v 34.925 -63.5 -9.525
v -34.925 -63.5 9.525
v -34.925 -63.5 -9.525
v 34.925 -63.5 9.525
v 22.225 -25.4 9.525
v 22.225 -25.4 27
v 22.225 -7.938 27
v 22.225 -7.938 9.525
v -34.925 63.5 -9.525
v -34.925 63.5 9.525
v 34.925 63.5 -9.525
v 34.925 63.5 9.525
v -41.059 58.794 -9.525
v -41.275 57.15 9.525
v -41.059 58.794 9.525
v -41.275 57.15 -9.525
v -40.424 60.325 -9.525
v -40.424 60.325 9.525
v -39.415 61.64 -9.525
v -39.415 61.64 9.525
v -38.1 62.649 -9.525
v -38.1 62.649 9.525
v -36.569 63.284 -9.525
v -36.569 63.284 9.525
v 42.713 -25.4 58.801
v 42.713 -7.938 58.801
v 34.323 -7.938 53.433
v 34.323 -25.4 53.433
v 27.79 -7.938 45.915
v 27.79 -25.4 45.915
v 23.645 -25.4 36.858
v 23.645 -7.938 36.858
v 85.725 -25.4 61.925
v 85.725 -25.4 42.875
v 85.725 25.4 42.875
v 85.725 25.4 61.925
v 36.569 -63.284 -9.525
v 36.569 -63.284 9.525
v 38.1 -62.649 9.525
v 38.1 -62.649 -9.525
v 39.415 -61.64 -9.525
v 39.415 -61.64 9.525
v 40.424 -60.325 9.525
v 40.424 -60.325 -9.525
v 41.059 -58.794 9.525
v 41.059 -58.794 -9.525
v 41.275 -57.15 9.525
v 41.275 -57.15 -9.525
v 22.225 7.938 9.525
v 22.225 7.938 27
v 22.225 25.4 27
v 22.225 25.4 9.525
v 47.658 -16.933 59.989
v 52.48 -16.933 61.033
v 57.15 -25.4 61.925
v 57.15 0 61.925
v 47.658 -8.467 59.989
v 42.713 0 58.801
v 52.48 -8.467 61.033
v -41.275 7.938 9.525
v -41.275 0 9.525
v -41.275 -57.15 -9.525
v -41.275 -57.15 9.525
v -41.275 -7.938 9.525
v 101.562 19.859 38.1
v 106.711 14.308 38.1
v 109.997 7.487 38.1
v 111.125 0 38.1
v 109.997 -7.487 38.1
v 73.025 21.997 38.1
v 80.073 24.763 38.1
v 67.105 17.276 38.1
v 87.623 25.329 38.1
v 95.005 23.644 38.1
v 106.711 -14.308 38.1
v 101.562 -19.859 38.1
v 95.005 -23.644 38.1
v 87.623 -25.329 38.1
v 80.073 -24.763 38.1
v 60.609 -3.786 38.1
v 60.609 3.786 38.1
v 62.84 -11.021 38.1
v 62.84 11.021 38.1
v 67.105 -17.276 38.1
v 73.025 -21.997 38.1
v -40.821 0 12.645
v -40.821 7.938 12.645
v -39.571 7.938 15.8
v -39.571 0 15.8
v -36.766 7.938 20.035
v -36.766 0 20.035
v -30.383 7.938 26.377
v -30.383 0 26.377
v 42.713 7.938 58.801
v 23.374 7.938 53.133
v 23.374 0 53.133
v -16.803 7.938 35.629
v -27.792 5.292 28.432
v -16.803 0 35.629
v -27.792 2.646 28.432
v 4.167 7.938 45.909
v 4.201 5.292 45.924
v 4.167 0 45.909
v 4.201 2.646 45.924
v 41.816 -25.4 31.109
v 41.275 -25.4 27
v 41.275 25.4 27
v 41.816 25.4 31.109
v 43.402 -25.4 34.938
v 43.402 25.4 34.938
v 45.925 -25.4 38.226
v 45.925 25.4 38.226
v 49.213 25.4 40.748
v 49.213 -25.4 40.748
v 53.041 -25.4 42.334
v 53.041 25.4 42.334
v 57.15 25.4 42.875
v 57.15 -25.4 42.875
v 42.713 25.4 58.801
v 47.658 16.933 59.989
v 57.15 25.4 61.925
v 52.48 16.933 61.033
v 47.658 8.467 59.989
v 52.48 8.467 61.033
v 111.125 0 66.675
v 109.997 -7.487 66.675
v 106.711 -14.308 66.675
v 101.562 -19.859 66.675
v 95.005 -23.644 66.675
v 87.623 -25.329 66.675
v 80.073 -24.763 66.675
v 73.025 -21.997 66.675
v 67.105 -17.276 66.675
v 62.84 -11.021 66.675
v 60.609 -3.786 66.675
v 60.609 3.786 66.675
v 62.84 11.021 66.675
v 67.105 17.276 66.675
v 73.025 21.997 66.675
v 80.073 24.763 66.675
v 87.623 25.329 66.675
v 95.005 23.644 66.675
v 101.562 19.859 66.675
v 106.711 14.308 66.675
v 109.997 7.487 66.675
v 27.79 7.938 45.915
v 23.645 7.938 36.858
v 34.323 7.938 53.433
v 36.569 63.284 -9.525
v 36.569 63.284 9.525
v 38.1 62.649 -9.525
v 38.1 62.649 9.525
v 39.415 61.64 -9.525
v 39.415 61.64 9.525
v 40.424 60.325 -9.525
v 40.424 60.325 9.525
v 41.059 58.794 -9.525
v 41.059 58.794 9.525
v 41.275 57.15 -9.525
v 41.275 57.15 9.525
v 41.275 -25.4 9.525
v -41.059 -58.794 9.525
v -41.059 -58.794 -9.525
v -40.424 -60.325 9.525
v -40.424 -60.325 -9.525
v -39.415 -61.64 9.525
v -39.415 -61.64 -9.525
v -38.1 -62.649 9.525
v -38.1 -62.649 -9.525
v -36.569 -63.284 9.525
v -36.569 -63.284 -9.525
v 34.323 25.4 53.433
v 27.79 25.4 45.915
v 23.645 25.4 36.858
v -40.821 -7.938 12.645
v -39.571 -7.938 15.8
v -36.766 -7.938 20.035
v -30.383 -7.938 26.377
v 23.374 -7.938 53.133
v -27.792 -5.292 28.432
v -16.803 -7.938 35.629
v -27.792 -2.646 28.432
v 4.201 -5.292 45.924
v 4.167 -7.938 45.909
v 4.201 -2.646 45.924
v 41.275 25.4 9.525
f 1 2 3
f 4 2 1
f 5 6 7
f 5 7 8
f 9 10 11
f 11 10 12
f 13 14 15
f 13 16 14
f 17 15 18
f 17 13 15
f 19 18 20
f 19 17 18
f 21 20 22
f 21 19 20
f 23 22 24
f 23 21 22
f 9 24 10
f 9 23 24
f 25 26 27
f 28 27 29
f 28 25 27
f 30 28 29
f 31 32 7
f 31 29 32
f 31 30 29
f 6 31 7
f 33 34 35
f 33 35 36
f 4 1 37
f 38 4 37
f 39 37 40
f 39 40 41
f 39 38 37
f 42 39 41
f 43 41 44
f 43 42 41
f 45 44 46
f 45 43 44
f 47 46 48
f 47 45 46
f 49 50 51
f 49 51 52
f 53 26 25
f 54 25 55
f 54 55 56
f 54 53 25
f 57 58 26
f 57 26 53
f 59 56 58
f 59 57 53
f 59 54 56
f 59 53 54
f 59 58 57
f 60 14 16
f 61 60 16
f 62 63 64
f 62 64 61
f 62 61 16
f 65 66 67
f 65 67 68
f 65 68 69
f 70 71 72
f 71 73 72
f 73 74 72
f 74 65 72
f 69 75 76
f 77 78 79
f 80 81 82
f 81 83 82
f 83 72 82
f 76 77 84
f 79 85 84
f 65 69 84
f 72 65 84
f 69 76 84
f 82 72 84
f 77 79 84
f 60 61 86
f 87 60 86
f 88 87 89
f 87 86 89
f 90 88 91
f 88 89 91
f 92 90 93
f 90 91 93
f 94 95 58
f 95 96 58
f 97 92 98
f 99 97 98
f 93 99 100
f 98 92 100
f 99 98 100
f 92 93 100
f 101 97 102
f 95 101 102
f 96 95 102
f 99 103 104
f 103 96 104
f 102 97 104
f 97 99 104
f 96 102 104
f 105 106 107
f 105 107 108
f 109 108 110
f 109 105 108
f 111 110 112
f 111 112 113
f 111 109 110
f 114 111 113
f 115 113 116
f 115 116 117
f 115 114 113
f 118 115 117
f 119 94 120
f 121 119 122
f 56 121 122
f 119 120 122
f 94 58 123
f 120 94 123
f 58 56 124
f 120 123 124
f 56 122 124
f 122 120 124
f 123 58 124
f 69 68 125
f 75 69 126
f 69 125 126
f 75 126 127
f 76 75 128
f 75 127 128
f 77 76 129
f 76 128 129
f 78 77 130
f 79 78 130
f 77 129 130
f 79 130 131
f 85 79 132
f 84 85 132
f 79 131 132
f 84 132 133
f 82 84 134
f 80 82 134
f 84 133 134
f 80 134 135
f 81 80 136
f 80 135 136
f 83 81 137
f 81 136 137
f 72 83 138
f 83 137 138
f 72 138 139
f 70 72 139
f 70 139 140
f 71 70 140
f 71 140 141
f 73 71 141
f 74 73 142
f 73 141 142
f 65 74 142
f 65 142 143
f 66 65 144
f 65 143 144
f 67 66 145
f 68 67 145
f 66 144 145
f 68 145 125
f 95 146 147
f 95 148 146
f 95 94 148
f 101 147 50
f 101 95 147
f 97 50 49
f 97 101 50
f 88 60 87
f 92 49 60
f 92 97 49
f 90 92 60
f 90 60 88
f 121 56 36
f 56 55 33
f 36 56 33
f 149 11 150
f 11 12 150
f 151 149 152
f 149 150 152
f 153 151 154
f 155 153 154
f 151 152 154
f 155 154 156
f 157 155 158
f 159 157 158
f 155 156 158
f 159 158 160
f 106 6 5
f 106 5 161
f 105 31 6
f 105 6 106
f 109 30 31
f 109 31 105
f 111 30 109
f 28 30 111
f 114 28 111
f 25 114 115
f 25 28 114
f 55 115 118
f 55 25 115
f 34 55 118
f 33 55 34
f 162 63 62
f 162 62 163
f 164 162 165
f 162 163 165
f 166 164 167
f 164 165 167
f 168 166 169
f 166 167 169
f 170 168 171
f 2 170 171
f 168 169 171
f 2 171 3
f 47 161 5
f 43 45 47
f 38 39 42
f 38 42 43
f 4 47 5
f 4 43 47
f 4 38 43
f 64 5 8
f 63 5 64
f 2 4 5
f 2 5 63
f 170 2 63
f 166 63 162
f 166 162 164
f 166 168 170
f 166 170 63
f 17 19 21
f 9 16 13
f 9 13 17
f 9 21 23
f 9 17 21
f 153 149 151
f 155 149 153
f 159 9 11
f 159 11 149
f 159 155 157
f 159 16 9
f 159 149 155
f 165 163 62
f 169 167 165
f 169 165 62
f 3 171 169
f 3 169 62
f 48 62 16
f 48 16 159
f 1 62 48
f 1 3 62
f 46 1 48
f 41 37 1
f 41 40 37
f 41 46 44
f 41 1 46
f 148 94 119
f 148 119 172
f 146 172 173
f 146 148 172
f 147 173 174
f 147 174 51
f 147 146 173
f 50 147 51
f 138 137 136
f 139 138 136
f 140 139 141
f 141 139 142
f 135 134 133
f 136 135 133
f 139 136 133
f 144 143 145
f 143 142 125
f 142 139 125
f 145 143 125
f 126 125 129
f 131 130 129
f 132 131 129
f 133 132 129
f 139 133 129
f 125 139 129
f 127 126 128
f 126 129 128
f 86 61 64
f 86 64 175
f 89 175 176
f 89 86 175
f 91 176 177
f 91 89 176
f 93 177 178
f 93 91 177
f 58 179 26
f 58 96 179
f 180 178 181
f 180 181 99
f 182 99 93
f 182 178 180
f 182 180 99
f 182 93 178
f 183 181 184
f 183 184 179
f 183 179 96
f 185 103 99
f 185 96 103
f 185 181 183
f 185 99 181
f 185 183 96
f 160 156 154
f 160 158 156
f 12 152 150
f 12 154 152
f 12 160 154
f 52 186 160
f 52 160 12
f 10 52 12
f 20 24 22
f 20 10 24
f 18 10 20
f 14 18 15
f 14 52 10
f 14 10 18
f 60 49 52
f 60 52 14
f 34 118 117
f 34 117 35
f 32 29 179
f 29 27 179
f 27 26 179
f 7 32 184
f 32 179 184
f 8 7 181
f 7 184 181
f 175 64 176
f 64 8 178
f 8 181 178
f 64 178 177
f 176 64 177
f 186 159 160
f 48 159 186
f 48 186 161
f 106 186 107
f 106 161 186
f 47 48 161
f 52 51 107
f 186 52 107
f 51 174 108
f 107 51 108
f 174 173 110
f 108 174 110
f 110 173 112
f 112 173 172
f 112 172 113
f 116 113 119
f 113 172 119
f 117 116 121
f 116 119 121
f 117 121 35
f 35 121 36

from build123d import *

# Parameters (mm, degrees)
F1_DEPTH = 25.4
F2_DEPTH = 63.5
F0_W     = 25.4
F0_H     = 19.05
F3_DEPTH = 25.4
F4_DEPTH = 7.9375
F6_R     = 6.35


with BuildPart() as f1:
    # F0 (on Front) → F1 (new body, symmetric)
    with BuildSketch(Plane.XZ):
        with BuildLine():
            Line((22.225, 9.525), (41.275, 9.525))
            Line((41.275, 9.525), (41.275, 27.0002))
            ThreePointArc((41.275, 27.0002), (45.9246798487, 38.2255201513), (57.15, 42.8752))
            Line((57.15, 42.8752), (60.325, 42.8752))
            Line((60.325, 42.8752), (60.325, 61.9252))
            Line((60.325, 61.9252), (57.15, 61.9252))
            add(Edge.make_bspline(
                [(42.7127144253, 58.8014642867), (47.7105898619, 60.0589943482), (52.5646894351, 61.1113536109), (57.15, 61.9252)],
                knots=[98.4748770182, 98.4748770182, 98.4748770182, 98.4748770182, 111.5045361635, 111.5045361635, 111.5045361635, 111.5045361635], degree=3))
            ThreePointArc((42.7127144253, 58.8014642867), (27.7903523208, 45.9149221273), (22.225, 27.0002))
            Line((22.225, 27.0002), (22.225, 9.525))
        make_face()
    extrude(amount=F1_DEPTH, both=True)

    # F0 (on Front) → F2 (join, symmetric)
    with BuildSketch(Plane.XZ):
        Polygon((-41.275, 9.525), (-41.275, -9.525), (41.275, -9.525), (41.275, 9.525), (22.225, 9.525), align=None)
    extrude(amount=F2_DEPTH, both=True)

    # F0 (on Front) → F3 (join, symmetric)
    with BuildSketch(Plane.XZ):
        with Locations((73.025, 52.4002)):
            Rectangle(F0_W, F0_H)
    extrude(amount=F3_DEPTH, both=True)

    # F0 (on Front) → F4 (join, symmetric)
    with BuildSketch(Plane.XZ):
        with BuildLine():
            add(Edge.make_bspline(
                [(-41.275, 9.525), (-41.0450619482, 28.0740104244), (4.9400326168, 49.2973693012), (42.7127144253, 58.8014642867)],
                knots=[0, 0, 0, 0, 98.4748770182, 98.4748770182, 98.4748770182, 98.4748770182], degree=3))
            Line((-41.275, 9.525), (22.225, 9.525))
            Line((22.225, 9.525), (22.225, 27.0002))
            ThreePointArc((22.225, 27.0002), (27.7903523208, 45.9149221273), (42.7127144253, 58.8014642867))
        make_face()
    extrude(amount=F4_DEPTH, both=True)

    # F6
    f6_edges = [f1.edges().sort_by_distance(p)[0] for p in [
        (41.275, -63.5, 0),
        (-41.275, -63.5, 0),
        (41.275, 63.5, 0),
        (-41.275, 63.5, 0),
    ]]
    fillet(f6_edges, radius=F6_R)


with BuildPart() as f5:
    # F0 (on Front) → F5 (revolve)
    with BuildSketch(Plane.XZ):
        Polygon((85.725, 66.675), (85.725, 61.9252), (85.725, 42.8752), (85.725, 38.1), (111.125, 38.1), (111.125, 66.675), align=None)
    revolve(axis=Axis((85.725, 0, 52.3875), (0, 0, -1)))


solid = Compound([f1.part, f5.part])
